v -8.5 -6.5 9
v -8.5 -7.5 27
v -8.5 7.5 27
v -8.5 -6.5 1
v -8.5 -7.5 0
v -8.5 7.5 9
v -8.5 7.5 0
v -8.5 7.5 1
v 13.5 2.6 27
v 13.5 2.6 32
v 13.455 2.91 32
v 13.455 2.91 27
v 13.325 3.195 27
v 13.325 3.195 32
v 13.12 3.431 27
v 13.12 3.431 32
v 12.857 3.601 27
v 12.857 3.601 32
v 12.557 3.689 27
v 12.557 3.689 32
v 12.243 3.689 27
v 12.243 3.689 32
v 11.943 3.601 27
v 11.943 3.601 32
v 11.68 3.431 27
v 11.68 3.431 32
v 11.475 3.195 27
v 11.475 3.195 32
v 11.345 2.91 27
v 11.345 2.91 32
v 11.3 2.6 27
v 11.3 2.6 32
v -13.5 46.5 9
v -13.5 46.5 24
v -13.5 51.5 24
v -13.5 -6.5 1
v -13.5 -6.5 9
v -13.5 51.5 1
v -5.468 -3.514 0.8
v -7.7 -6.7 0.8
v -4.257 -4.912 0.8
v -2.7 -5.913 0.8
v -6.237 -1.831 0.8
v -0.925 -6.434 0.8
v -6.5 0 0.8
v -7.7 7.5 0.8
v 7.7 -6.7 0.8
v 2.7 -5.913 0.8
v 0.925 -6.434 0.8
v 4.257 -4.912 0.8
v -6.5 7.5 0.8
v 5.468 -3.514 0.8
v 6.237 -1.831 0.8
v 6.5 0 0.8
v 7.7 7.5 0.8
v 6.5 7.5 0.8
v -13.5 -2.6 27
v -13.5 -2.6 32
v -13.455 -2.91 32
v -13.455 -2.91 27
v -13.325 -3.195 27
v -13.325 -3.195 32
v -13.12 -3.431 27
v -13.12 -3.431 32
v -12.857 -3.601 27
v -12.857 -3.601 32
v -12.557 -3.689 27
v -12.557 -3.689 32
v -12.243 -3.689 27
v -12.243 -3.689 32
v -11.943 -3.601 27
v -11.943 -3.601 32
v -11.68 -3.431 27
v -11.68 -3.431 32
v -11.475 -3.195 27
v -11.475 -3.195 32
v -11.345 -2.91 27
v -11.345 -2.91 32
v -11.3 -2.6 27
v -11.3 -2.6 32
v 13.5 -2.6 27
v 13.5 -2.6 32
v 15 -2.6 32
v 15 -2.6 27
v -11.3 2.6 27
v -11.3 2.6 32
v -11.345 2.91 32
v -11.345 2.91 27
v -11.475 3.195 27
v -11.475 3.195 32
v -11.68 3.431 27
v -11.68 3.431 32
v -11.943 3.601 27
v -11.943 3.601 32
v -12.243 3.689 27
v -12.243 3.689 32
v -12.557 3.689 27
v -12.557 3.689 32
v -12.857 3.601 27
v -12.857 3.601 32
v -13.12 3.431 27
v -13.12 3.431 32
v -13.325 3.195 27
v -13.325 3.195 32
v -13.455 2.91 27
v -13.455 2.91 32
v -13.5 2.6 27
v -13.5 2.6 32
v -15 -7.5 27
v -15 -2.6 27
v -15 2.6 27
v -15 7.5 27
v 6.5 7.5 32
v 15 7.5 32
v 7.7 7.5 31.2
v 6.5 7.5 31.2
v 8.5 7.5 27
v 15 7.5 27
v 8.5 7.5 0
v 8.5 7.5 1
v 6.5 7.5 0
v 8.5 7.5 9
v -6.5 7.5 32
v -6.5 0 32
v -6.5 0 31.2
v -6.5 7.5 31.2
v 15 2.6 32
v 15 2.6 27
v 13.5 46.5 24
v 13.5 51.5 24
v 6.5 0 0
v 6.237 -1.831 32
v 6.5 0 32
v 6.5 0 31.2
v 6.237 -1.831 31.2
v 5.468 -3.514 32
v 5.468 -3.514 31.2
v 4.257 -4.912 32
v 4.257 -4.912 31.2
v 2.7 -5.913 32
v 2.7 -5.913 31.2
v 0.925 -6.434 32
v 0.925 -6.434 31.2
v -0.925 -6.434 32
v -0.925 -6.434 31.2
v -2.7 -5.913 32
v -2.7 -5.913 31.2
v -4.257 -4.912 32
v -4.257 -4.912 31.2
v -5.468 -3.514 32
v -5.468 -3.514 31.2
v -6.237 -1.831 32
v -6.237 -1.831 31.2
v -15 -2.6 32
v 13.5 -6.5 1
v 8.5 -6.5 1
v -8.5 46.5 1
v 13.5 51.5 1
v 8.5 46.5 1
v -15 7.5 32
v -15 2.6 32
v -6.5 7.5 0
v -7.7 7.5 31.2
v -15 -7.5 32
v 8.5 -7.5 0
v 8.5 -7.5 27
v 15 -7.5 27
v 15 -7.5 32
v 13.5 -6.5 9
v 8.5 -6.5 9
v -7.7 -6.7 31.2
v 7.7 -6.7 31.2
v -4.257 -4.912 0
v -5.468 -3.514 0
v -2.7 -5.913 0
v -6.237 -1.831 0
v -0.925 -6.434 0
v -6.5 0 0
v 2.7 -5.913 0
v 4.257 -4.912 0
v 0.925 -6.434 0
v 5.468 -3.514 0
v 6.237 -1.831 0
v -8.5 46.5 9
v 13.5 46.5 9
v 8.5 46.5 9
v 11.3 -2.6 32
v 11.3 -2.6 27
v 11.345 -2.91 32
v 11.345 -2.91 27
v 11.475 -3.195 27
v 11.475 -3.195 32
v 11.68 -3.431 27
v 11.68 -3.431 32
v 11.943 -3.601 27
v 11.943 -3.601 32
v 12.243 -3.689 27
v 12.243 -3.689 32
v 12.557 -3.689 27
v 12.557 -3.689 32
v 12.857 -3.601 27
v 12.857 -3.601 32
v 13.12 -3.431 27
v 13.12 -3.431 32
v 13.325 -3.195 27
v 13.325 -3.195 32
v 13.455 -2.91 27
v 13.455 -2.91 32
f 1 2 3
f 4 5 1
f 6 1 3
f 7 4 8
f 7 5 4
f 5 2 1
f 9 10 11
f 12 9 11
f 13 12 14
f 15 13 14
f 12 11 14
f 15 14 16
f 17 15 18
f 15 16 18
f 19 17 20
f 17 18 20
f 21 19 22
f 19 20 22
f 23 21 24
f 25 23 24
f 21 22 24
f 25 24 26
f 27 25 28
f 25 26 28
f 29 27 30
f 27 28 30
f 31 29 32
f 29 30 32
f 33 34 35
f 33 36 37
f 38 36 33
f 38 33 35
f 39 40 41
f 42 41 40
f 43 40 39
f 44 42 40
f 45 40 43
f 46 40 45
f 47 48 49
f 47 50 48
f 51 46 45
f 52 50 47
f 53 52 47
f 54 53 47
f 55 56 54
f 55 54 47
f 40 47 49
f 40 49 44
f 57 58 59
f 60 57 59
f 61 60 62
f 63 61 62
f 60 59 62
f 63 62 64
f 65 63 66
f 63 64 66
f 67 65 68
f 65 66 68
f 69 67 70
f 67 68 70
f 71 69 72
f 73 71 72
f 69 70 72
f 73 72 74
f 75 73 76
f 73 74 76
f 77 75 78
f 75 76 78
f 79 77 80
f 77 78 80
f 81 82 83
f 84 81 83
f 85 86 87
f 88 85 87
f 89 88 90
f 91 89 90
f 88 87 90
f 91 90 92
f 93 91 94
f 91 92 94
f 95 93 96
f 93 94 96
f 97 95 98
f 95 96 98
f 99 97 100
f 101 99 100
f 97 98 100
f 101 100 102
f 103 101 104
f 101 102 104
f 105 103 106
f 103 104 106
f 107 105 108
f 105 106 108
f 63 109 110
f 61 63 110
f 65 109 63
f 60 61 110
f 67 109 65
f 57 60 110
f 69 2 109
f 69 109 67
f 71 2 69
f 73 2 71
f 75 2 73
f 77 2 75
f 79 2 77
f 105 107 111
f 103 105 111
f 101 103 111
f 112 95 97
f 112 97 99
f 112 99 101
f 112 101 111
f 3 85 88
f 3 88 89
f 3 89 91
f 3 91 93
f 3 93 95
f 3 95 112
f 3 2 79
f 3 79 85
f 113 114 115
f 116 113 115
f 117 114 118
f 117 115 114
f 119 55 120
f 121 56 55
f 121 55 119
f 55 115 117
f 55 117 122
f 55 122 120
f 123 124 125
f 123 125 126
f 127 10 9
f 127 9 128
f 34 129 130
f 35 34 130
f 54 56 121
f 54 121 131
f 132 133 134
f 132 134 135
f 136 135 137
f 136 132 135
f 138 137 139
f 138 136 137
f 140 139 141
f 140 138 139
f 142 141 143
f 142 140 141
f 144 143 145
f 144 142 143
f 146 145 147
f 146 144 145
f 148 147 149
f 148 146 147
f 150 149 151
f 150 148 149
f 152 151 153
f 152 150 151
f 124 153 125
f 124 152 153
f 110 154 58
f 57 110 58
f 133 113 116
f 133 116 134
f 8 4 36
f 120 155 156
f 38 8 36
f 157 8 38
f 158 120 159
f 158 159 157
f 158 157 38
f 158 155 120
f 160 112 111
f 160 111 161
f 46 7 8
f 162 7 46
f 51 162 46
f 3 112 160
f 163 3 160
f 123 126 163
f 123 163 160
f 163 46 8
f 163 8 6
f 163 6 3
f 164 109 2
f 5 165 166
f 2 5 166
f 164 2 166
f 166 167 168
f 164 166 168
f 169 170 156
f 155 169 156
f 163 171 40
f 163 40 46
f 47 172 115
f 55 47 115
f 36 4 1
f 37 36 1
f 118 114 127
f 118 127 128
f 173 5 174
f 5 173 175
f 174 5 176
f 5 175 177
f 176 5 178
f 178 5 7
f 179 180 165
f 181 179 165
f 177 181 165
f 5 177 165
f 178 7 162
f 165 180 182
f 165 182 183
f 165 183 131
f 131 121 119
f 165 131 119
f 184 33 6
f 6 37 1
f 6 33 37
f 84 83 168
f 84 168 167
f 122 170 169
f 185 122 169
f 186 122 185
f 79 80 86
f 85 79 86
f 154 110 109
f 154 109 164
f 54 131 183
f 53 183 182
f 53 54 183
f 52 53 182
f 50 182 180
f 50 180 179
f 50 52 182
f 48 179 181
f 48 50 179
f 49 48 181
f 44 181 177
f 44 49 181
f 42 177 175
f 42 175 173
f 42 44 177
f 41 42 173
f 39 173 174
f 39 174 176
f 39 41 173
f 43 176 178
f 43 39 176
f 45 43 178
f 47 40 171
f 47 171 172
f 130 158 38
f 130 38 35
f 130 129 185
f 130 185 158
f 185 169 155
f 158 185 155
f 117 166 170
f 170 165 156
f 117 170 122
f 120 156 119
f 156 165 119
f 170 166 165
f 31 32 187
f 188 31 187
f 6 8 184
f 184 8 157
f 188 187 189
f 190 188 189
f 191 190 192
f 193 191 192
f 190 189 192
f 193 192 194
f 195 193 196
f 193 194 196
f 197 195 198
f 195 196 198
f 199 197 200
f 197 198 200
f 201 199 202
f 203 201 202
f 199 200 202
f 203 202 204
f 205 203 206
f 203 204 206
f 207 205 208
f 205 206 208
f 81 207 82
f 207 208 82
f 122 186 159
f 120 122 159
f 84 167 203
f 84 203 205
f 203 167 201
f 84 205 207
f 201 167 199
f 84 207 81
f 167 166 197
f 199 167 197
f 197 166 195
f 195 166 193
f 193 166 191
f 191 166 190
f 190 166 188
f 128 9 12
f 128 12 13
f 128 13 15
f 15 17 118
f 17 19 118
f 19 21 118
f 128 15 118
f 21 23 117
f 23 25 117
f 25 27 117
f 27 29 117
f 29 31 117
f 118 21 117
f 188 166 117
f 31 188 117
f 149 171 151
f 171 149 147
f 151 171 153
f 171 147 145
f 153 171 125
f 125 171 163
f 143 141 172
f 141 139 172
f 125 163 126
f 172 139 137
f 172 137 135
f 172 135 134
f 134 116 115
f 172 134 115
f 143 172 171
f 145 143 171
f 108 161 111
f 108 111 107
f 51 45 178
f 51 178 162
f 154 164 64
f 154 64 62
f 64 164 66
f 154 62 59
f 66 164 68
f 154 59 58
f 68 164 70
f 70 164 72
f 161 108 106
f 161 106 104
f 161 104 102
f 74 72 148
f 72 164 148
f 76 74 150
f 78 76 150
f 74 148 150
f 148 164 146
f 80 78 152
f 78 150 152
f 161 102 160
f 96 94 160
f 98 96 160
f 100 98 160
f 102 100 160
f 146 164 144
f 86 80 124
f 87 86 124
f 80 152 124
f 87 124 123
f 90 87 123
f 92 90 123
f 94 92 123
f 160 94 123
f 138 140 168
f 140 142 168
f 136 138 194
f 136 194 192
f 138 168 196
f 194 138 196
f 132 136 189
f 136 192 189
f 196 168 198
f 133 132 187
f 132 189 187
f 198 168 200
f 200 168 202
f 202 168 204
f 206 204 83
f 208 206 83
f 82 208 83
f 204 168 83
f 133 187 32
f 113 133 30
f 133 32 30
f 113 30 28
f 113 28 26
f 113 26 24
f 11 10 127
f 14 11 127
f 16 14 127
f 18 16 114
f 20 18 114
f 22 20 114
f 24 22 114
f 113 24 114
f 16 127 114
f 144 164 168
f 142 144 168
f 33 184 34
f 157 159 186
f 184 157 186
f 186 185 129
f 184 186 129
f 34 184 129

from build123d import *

# Parameters (mm, degrees)
CROQUIS1_W              = 17
CROQUIS1_H              = 15
SALIENTE_EXTRUIR1_DEPTH = 32
VACIADO1_T              = -0.8
CORTAR_EXTRUIR1_DEPTH   = 32
CROQUIS3_W              = 5
CROQUIS3_H              = 15
SALIENTE_EXTRUIR2_DEPTH = 6.5
CROQUIS4_W              = 5
CROQUIS4_H              = 15
SALIENTE_EXTRUIR3_DEPTH = 6.5
CORTAR_EXTRUIR2_DEPTH   = 6.5
CROQUIS6_W              = 1.5
CROQUIS6_H              = 5.2
CORTAR_EXTRUIR3_DEPTH   = 10
CROQUIS7_W              = 8
CROQUIS7_H              = 13
SALIENTE_EXTRUIR4_DEPTH = 5
CROQUIS8_W              = 8
CROQUIS8_H              = 13
SALIENTE_EXTRUIR5_DEPTH = 5
CROQUIS9_W              = 5
CROQUIS9_H              = 8
SALIENTE_EXTRUIR6_DEPTH = 45
CROQUIS10_W             = 5
CROQUIS10_H             = 5
SALIENTE_EXTRUIR7_DEPTH = 15
CROQUIS11_W             = 23
CROQUIS11_H             = 5
SALIENTE_EXTRUIR8_DEPTH = 11.5
CROQUIS12_W             = 23
CROQUIS12_H             = 5
SALIENTE_EXTRUIR9_DEPTH = 11.5


with BuildPart() as part:
    # Croquis1 → Saliente-Extruir1 (new body)
    with BuildSketch(Plane.XY):
        Rectangle(CROQUIS1_W, CROQUIS1_H)
    extrude(amount=SALIENTE_EXTRUIR1_DEPTH)

    # Vaciado1
    vaciado1_openings = [part.faces().sort_by_distance(p)[0] for p in [
        (0, 7.5, 16),
    ]]
    offset(amount=VACIADO1_T, openings=vaciado1_openings, kind=Kind.INTERSECTION)

    # Croquis2 → Cortar-Extruir1 (cut)
    with BuildSketch(Plane.XY.offset(32)):
        with BuildLine():
            Line((-6.5, 0), (-6.5, 7.5))
            Line((-6.5, 7.5), (6.5, 7.5))
            Line((6.5, 7.5), (6.5, 0))
            ThreePointArc((6.5, 0), (0, -6.5), (-6.5, 0))
        make_face()
    extrude(amount=-CORTAR_EXTRUIR1_DEPTH, mode=Mode.SUBTRACT)

    # Croquis3 → Saliente-Extruir2 (add)
    with BuildSketch(Plane(origin=(8.5, 0, 0), x_dir=(0, 0, -1), z_dir=(1, 0, 0))):
        with Locations((-29.5, 0)):
            Rectangle(CROQUIS3_W, CROQUIS3_H)
    extrude(amount=SALIENTE_EXTRUIR2_DEPTH)

    # Croquis4 → Saliente-Extruir3 (add)
    with BuildSketch(Plane.ZY.offset(8.5)):
        with Locations((29.5, 0)):
            Rectangle(CROQUIS4_W, CROQUIS4_H)
    extrude(amount=SALIENTE_EXTRUIR3_DEPTH)

    # Croquis5 → Cortar-Extruir2 (cut)
    with BuildSketch(Plane.XY.offset(32)):
        with BuildLine():
            Line((-13.5, 2.6), (-13.5, -2.6))
            ThreePointArc((-13.5, -2.6), (-12.4, -3.7), (-11.3, -2.6))
            Line((-11.3, -2.6), (-11.3, 2.6))
            ThreePointArc((-11.3, 2.6), (-12.4, 3.7), (-13.5, 2.6))
        make_face()
        with BuildLine():
            Line((11.3, 2.6), (11.3, -2.6))
            ThreePointArc((11.3, -2.6), (12.4, -3.7), (13.5, -2.6))
            Line((13.5, -2.6), (13.5, 2.6))
            ThreePointArc((13.5, 2.6), (12.4, 3.7), (11.3, 2.6))
        make_face()
    extrude(amount=-CORTAR_EXTRUIR2_DEPTH, mode=Mode.SUBTRACT)

    # Croquis6 → Cortar-Extruir3 (cut)
    with BuildSketch(Plane.XY.offset(32)):
        with Locations((-14.25, 0)):
            Rectangle(CROQUIS6_W, CROQUIS6_H)
        with Locations((14.25, 0)):
            Rectangle(CROQUIS6_W, CROQUIS6_H)
    extrude(amount=-CORTAR_EXTRUIR3_DEPTH, mode=Mode.SUBTRACT)

    # Croquis7 → Saliente-Extruir4 (add)
    with BuildSketch(Plane(origin=(8.5, 0, 0), x_dir=(0, 0, -1), z_dir=(1, 0, 0))):
        with Locations((-5, 0)):
            Rectangle(CROQUIS7_W, CROQUIS7_H)
    extrude(amount=SALIENTE_EXTRUIR4_DEPTH)

    # Croquis8 → Saliente-Extruir5 (add)
    with BuildSketch(Plane.ZY.offset(8.5)):
        with Locations((5, 0)):
            Rectangle(CROQUIS8_W, CROQUIS8_H)
    extrude(amount=SALIENTE_EXTRUIR5_DEPTH)

    # Croquis9 → Saliente-Extruir6 (add)
    with BuildSketch(Plane(origin=(0, 6.5, 0), x_dir=(1, 0, 0), z_dir=(0, 1, 0))):
        with Locations((-11, -5)):
            Rectangle(CROQUIS9_W, CROQUIS9_H)
        with Locations((11, -5)):
            Rectangle(CROQUIS9_W, CROQUIS9_H)
    extrude(amount=SALIENTE_EXTRUIR6_DEPTH)

    # Croquis10 → Saliente-Extruir7 (add)
    with BuildSketch(Plane.XY.offset(9)):
        with Locations((-11, 49)):
            Rectangle(CROQUIS10_W, CROQUIS10_H)
        with Locations((11, 49)):
            Rectangle(CROQUIS10_W, CROQUIS10_H)
    extrude(amount=SALIENTE_EXTRUIR7_DEPTH)

    # Croquis11 → Saliente-Extruir8 (add)
    with BuildSketch(Plane(origin=(-8.5, 0, 0), x_dir=(0, 0, -1), z_dir=(1, 0, 0))):
        with Locations((-12.5, 49)):
            Rectangle(CROQUIS11_W, CROQUIS11_H)
    extrude(amount=SALIENTE_EXTRUIR8_DEPTH)

    # Croquis12 → Saliente-Extruir9 (add)
    with BuildSketch(Plane.ZY.offset(-8.5)):
        with Locations((12.5, 49)):
            Rectangle(CROQUIS12_W, CROQUIS12_H)
    extrude(amount=SALIENTE_EXTRUIR9_DEPTH)


solid = part.part
